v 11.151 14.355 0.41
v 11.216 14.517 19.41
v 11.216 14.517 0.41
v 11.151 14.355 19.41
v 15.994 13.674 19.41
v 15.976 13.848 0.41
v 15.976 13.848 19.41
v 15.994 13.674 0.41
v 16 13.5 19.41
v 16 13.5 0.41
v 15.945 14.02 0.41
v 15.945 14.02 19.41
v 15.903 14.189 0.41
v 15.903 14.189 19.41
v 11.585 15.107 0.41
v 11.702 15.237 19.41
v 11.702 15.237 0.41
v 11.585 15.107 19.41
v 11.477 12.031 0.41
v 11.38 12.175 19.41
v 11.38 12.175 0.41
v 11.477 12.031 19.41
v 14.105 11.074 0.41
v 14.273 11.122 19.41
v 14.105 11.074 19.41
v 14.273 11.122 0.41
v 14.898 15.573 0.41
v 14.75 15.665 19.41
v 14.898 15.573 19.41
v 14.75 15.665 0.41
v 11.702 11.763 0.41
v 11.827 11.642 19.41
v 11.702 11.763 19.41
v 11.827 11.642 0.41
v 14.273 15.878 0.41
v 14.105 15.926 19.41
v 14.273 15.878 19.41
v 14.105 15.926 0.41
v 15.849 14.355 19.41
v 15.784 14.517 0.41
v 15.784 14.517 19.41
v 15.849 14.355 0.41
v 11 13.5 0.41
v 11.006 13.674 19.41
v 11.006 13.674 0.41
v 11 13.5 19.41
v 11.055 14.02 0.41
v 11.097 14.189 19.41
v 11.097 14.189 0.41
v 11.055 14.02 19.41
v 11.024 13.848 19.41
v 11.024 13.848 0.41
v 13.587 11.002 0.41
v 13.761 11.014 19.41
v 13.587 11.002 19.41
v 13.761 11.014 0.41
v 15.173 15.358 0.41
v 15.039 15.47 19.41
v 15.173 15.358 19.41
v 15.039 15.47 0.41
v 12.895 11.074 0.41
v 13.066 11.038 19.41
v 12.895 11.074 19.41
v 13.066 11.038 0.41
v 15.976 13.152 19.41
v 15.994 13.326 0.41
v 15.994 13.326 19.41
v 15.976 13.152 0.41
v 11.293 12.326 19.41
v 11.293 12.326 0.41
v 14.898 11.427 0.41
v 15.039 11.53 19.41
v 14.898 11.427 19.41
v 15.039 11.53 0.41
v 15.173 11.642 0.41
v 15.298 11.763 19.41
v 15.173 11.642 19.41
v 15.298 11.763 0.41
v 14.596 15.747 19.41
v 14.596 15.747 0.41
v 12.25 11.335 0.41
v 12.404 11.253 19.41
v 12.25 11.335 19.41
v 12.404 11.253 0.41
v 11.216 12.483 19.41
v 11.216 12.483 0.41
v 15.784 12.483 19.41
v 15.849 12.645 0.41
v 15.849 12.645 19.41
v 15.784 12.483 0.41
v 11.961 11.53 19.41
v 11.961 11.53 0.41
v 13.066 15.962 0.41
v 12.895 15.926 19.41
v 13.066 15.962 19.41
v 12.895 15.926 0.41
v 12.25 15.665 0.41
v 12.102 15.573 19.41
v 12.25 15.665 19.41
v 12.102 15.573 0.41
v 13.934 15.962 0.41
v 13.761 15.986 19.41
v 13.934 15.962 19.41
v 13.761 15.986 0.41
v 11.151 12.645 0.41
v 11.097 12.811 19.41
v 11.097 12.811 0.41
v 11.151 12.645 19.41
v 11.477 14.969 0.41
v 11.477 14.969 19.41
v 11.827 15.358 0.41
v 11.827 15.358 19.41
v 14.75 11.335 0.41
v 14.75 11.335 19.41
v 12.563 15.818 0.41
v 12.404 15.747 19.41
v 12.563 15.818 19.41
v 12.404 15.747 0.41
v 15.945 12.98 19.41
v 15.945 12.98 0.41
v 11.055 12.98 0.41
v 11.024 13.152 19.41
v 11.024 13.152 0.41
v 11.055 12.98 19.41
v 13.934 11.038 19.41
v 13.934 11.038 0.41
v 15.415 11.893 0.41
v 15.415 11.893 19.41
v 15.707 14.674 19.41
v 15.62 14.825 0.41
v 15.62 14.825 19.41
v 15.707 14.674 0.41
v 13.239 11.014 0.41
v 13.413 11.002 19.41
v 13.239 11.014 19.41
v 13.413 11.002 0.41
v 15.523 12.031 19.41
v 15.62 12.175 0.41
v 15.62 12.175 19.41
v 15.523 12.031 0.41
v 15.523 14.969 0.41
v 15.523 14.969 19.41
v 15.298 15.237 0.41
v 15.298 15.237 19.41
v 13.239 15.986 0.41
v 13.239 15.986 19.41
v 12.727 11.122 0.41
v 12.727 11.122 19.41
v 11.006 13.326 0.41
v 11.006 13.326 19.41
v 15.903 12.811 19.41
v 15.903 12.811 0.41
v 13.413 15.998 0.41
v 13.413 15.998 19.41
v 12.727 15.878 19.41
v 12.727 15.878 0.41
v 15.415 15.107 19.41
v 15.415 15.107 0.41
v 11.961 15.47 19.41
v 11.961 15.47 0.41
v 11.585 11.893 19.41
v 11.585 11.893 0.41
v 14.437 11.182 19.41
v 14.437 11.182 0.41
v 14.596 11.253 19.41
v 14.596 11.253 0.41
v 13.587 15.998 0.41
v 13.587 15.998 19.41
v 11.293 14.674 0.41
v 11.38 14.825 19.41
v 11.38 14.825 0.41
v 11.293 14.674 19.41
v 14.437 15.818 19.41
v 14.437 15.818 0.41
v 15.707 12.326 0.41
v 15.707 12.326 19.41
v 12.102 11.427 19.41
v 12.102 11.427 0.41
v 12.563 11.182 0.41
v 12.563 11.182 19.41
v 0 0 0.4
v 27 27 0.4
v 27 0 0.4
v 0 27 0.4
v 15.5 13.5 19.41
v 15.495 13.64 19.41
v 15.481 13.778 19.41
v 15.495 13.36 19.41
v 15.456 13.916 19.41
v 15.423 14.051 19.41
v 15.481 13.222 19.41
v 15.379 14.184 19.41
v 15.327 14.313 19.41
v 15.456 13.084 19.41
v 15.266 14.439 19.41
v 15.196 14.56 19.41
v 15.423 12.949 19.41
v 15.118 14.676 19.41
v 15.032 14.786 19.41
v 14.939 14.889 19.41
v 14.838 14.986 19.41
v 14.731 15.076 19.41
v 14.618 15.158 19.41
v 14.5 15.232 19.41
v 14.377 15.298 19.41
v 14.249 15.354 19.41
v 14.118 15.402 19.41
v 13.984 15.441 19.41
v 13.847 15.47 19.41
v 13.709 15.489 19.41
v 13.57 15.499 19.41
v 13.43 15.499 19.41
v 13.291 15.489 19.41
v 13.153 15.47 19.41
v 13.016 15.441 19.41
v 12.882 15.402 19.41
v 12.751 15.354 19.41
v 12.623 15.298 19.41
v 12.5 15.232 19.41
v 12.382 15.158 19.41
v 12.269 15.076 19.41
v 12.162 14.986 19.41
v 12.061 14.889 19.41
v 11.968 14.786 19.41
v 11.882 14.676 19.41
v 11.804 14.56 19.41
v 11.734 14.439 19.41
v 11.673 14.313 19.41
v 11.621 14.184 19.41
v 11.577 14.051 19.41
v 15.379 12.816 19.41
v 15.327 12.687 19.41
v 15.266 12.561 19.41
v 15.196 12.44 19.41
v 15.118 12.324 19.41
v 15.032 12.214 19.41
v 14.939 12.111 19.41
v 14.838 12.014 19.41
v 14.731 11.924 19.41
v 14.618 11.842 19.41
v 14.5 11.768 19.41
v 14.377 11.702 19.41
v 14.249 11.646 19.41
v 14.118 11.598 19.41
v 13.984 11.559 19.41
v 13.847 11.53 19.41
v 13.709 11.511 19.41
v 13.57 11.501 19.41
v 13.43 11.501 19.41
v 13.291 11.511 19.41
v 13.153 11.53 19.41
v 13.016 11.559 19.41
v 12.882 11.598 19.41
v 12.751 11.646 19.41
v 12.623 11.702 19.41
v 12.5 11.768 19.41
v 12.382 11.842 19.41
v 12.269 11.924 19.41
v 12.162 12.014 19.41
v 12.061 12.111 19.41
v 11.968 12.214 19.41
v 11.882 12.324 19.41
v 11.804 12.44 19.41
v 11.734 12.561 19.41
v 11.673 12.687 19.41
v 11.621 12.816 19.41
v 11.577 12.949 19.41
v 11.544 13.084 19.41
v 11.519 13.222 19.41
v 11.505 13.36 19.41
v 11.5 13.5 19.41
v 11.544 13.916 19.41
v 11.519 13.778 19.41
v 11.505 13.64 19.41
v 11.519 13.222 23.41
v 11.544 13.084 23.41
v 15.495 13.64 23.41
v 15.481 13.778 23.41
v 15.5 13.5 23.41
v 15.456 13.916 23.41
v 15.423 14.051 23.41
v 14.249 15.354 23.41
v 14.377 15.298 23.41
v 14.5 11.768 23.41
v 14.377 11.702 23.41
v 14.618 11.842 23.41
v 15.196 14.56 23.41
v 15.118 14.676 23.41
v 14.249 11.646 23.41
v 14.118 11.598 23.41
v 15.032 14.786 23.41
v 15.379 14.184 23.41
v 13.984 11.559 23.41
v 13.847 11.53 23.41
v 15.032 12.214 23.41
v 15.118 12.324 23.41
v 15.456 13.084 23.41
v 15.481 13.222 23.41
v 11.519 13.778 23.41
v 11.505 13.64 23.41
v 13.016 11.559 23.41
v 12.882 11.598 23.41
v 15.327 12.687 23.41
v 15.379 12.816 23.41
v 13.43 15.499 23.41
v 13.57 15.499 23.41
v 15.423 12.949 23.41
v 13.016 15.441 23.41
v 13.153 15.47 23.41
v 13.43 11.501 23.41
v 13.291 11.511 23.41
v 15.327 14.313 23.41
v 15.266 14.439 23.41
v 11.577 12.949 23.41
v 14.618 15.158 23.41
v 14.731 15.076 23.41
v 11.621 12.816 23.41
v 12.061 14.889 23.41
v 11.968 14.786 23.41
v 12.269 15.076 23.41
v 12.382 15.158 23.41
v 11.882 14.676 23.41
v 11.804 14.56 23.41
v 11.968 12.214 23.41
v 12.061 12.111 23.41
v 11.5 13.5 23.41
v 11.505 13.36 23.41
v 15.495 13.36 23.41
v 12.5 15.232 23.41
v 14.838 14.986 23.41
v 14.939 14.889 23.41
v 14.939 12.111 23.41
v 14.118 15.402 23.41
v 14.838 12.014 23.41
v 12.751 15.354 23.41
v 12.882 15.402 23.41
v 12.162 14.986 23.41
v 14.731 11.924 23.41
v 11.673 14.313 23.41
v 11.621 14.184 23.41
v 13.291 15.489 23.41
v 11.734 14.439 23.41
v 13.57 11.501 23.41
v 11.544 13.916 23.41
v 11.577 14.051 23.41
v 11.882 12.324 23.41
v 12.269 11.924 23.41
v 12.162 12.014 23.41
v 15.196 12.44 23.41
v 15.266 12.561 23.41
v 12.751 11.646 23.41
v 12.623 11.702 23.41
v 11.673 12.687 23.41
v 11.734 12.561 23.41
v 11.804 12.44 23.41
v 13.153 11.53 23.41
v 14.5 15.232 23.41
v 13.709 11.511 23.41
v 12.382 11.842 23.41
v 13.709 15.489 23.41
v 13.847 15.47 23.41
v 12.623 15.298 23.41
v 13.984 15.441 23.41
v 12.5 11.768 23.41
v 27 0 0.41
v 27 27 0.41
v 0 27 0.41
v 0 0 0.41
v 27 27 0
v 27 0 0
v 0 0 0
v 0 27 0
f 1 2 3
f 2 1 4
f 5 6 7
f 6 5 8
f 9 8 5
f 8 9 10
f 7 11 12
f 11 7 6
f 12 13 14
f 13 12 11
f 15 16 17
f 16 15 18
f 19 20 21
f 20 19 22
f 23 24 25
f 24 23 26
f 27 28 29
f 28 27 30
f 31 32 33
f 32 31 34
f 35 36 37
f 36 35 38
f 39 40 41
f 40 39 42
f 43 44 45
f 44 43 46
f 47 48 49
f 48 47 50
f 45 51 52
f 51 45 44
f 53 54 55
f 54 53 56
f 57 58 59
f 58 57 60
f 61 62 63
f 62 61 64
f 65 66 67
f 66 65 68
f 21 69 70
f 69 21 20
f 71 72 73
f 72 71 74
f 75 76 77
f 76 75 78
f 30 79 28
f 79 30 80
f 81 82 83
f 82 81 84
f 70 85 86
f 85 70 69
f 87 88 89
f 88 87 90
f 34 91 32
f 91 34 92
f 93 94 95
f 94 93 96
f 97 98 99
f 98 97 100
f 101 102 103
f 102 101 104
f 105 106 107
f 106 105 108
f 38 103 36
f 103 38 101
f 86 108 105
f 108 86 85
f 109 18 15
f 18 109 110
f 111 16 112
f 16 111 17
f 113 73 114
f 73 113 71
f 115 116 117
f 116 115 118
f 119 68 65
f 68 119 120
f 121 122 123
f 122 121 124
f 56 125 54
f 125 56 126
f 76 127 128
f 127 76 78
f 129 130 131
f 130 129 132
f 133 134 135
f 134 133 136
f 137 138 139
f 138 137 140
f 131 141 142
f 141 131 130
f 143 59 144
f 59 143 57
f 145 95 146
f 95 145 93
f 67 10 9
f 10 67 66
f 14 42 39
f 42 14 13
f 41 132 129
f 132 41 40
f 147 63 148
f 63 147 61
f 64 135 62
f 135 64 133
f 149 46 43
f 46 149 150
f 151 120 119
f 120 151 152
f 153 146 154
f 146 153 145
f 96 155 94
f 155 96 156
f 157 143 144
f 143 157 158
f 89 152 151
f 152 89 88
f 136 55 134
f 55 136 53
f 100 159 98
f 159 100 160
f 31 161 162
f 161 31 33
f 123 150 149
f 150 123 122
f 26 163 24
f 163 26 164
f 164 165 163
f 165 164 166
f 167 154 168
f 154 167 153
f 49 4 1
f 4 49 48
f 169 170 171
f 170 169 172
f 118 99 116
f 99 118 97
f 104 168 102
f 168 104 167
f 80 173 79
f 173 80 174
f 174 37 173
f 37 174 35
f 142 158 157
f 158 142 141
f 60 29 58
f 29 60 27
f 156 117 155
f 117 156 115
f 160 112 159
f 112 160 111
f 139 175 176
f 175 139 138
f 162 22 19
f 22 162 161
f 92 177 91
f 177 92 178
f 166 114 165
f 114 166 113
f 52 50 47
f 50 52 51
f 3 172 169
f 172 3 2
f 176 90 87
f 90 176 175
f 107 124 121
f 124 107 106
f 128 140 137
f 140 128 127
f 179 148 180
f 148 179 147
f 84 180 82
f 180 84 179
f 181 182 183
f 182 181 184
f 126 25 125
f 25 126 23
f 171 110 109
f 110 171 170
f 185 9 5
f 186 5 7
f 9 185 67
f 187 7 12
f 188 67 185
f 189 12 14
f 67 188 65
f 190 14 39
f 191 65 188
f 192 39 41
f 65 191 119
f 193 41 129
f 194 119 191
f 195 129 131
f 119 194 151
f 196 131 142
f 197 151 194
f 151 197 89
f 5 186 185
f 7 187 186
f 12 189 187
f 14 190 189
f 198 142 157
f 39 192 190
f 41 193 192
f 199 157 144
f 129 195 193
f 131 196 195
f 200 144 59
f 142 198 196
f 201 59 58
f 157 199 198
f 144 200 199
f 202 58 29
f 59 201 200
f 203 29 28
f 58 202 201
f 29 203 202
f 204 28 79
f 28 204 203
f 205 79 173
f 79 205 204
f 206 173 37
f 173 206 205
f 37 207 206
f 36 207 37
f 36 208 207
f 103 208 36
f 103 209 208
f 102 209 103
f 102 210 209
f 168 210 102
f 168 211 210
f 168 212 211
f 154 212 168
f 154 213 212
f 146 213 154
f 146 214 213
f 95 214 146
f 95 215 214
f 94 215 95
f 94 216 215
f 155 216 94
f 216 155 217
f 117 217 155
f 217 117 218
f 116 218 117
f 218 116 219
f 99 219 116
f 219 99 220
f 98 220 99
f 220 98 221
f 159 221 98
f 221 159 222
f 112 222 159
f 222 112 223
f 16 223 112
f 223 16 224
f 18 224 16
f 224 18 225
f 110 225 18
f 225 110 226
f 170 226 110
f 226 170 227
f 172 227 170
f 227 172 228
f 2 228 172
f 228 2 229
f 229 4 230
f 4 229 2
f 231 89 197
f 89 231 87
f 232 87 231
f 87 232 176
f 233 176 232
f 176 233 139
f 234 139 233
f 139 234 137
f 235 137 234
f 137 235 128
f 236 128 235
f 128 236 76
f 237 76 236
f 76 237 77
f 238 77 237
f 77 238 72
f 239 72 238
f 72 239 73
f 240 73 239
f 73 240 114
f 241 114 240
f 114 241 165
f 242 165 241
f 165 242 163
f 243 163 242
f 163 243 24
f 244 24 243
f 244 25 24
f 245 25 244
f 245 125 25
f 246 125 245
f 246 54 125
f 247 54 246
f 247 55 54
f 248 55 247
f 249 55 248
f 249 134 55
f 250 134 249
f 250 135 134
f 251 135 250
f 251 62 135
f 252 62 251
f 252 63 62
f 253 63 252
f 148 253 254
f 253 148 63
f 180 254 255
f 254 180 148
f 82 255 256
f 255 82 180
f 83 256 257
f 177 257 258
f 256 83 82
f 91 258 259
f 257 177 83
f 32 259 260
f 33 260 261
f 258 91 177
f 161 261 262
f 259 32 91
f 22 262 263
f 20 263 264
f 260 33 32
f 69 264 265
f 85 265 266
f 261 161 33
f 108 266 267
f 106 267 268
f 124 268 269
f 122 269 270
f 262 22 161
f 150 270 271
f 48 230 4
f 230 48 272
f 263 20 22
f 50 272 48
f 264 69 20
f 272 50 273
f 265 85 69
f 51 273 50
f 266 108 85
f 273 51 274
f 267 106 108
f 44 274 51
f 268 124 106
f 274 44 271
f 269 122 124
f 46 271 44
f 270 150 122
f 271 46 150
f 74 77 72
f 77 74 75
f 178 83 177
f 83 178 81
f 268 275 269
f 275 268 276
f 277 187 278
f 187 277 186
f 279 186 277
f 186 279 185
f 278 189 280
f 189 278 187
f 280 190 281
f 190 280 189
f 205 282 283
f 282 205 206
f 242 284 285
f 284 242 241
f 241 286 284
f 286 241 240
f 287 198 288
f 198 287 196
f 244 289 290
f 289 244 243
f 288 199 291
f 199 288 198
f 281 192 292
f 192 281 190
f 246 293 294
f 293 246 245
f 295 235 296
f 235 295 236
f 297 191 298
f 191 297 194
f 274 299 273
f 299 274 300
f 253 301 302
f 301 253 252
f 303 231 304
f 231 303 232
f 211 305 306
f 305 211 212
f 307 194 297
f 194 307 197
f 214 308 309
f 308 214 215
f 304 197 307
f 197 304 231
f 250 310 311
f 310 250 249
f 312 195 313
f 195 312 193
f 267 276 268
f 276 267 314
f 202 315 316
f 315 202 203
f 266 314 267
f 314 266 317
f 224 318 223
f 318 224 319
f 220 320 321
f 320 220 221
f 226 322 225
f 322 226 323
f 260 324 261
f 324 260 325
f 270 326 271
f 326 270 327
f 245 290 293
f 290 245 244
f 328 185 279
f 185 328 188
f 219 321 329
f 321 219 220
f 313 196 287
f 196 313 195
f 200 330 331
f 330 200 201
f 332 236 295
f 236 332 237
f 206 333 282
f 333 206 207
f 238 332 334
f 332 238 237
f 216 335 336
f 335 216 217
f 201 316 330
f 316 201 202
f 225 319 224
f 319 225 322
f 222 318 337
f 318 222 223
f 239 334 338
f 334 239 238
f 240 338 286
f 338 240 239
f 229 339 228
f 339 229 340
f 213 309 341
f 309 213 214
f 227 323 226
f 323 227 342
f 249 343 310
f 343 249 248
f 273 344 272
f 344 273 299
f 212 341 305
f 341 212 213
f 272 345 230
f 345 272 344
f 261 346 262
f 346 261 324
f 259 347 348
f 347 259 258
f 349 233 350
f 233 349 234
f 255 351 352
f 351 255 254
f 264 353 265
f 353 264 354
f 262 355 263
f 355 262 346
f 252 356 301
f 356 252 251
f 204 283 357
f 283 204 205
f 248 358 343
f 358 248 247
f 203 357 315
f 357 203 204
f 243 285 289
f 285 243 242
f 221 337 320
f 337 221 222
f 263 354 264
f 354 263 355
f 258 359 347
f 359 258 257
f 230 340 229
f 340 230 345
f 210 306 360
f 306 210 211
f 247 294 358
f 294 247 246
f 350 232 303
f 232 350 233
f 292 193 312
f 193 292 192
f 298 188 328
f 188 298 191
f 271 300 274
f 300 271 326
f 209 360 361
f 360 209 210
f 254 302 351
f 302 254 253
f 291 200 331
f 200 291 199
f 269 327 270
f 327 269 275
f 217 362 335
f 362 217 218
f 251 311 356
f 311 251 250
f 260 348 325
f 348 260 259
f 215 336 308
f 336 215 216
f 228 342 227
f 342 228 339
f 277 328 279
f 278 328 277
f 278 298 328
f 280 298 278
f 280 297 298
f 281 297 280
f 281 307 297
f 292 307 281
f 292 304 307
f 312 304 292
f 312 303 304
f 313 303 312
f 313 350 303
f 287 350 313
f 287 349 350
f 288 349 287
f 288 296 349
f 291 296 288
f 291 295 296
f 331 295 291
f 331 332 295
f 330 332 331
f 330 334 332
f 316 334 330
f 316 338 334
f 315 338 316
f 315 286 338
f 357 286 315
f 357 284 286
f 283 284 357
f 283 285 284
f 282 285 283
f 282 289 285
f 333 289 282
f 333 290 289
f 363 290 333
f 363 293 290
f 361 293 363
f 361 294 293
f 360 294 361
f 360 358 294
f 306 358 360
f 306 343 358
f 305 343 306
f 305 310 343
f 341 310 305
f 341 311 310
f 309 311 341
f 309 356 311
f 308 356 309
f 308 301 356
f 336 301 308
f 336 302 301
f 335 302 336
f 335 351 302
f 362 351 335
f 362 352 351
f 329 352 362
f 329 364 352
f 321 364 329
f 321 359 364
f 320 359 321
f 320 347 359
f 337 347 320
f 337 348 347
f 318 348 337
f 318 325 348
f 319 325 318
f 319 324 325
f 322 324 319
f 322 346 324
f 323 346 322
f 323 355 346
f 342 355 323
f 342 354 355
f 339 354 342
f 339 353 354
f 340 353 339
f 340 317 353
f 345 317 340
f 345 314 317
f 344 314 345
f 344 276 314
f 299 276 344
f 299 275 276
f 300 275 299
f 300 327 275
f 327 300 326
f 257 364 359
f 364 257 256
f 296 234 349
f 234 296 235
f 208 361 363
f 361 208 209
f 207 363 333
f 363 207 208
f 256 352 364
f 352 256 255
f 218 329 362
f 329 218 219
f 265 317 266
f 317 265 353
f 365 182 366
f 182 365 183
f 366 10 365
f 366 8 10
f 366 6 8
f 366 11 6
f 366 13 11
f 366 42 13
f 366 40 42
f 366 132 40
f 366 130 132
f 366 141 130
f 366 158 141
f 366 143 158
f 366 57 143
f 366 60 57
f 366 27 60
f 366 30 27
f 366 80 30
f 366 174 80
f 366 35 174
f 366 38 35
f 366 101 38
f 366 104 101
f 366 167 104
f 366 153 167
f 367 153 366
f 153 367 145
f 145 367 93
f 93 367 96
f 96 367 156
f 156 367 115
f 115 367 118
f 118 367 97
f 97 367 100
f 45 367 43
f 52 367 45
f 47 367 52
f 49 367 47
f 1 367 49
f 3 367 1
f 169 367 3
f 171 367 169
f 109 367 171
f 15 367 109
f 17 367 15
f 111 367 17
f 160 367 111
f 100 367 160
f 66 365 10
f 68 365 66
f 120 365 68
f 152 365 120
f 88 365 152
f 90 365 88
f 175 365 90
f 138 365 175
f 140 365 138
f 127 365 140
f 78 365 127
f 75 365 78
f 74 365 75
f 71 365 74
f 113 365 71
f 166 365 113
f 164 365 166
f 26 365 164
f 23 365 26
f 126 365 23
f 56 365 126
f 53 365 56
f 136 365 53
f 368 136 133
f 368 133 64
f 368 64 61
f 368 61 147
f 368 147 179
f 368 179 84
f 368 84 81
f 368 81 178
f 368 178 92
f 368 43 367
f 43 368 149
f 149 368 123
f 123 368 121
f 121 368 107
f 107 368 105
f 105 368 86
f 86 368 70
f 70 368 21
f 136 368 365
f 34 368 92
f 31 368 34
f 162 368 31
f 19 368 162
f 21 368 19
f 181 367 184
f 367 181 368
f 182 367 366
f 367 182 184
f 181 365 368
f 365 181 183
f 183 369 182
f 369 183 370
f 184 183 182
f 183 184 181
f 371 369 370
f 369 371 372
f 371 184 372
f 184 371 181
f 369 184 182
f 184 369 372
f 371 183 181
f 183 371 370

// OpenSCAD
// file: ../../Base/Boxes.scad
// Fischertechnik Box Foundation
// Pre-designed Boxes

use <Constants.scad>

include <PlacementOptions.scad>

box190Width = 190;
box190Depth = 130;
box130Width = 130;
box130Depth = 95;
boxUsageHeight = 33.9;
boxWallThickness = 2.4;
boxBaseThickness = 1.0;
boxWebWidth = 3.0;

// getBoxWallThickness()
// Gets the wall thickness of a Fischertechnik Box

function getBoxWallThickness() = boxWallThickness;

// Gets the usable height of a fischertechnik box
function getBoxUsageHeight() = boxUsageHeight;

// Gets the thickness of the Fischertechnik box base.
function getBoxBaseThickness() = boxBaseThickness;

// Gets the width of a box web
function getBoxWebWidth() = boxWebWidth;

// Gets the usable inner space of a Box 190 as an x/y-list
function getBox190Space() = [
    box190Width - 2*getBoxWallThickness(), 
    box190Depth - 2*getBoxWallThickness() ];

// Imports the Fischertechnik empty box 130x190 mm and places it at position 0,0
// 190x130 are the outer sizes, the inner space is slightly smaller. Use getBox190Space() to get the inner sizes.
// This module needs the STL file "Fischertechnik Box 130x190.stl" in the library path.
// The box is positioned that the usable inner space is at the 0,0,0 position. The

module Box190() {
    translate([-getBoxWallThickness(),-getBoxWallThickness(),-getBoxBaseThickness()])
        import("Fischertechnik Box 130x190.stl", convexity=3);
}

// Gets the usable inner space of a Box 130 as an x/y-list
function getBox130Space() = [
    box130Width - 2*getBoxWallThickness(), 
    box130Depth - 2*getBoxWallThickness() ];

// Imports the Fischertechnik empty box 95x130 mm and places it at position 0,0
// 190x130 are the outer sizes, the inner space is slightly smaller. Use getBox190Space() to get the inner sizes.
// This module needs the STL file "Fischertechnik Box 95x130.stl" in the library path.
// The box is positioned that the usable inner space is at the 0,0,0 position. The

module Box130() {
    translate([-getBoxWallThickness(),-getBoxWallThickness(),-getBoxBaseThickness()])
        import("Fischertechnik Box 95x130.stl", convexity=3);
}

// Creates a web at the specified box walls
// corner 0 = LowerLeft, 1 = UpperLeft, 2 = UpperRight, 3 = LowerRight
// side 0 = LeftOfCorner, 1 = RightOfCorner
// distance = Distance in mm from the corner
// box = inner width and depth of the box (default: Box 190)
// webWidth = length of the web (default is 3 mms)
// webThickness = thickness of the web (default is 1 mm)

module BoxWeb(corner, side, distance, box=getBox190Space(), webWidth=getBoxWebWidth(), webThickness=1.0) {
    sink = getBoxWallThickness()/2;

    width = (corner % 2 == 0) ? 
            (side == LeftOfCorner ? webWidth : webThickness) :
            (side == LeftOfCorner ? webThickness : webWidth);

    depth = (corner % 2 == 0) ? 
            (side == RightOfCorner ? webWidth : webThickness) :
            (side == RightOfCorner ? webThickness : webWidth);
    
    xDiff = corner == LowerLeft ? 
                (side == LeftOfCorner ? -sink : distance) :
            (corner == UpperLeft ?                
                (side == LeftOfCorner ? distance : -sink) :
            (corner == UpperRight ?
                (side == LeftOfCorner ? box.x-webWidth+sink : box.x-distance-webThickness) :
                (side == LeftOfCorner ? box.x-distance-webThickness: box.x-webWidth+sink)));

    yDiff = corner == LowerLeft ? 
                (side == RightOfCorner ? -sink : distance) :
            (corner == UpperLeft ?
                (side == RightOfCorner ? box.y-distance : box.y-webWidth+sink) :
            (corner == UpperRight ?
                (side == RightOfCorner ? box.y-webWidth+sink : box.y-distance) :
                (side == RightOfCorner ? distance : -sink)));
    
    translate([xDiff, yDiff, -getExcess()])
        cube([width, depth, boxUsageHeight + 2*getExcess()]);
}
// file: ../../Base/Rotation.scad
// Fischertechnik Box Foundation
// Geometry Helpers Rotation

include <PlacementOptions.scad>

// getRotatedSpace(space, rotation=NoRotation)
// Rotates the space dependent on the specified rotation

function getRotatedSpace(space, rotation=NoRotation) = [
    (rotation == Rotate90 || rotation == Rotate270) ? space.y : space.x,
    (rotation == Rotate90 || rotation == Rotate270) ? space.x : space.y
];

// Rotates the given space around the fixed left lower corner
// space = the space the children needs as width/depth list [width,depth]
// rotation = 0 Rotate0 degrees, 1 Rotate90 degrees, 2 Rotate180 degrees, 3 Rotate270 degrees (equivalent to -90)

module RotateFix(space, rotation=Rotate0) {
    dy = (rotation == Rotate0 || rotation == Rotate270) ? 0 :
        (rotation == Rotate90) ? space.x :
        space.y;
    dx = (rotation < Rotate180) ? 0 :
        (rotation == Rotate180) ? space.x :
        space.y;
    
    translate([dx, dy, 0])
        rotate([0, 0, rotations[rotation]])
            children();
}
// file: ../../Base/Alignment.scad
// Fischertechnik Box Foundation
// Geometry Helpers Alignment

include <PlacementOptions.scad>

// getAlignedX(elementWidth, spaceWidth, align=AlignRight, offset=0)
// Gets the aligned X offset of an element with the given
// width in the given space.
// elementWidth = The width of the element to positon
// spaceWidth = The space where the element should be aligned
// align = 0 AlignLeft, 1 AlignCenter, 2 AlignRight
// offset = an optional offset from the aligned position. When
// aligned left or centered, then positive values are in X direction.
// When aligned right then positive values are in negative X direction.

function getAlignedX(elementWidth, spaceWidth, align=AlignRight, offset=0) =
    (align == AlignLeft) ?
        offset :
        ((align == AlignCenter) ?
        (spaceWidth - elementWidth)/2 + offset :
        spaceWidth - offset - elementWidth);

// getAlignedY(elementDepth, spaceDepth, align=AlignTop, offset=0)
// Gets the aligned Y offset of an element with the given
// depth in the given space.
// elementDepth = The depth of the element to positon
// spaceDepth = The space where the element should be aligned
// align = 0 AlignBottom, 1 AlignCenter, 2 AlignTop
// offset = an optional offset from the aligned position. When
// aligned bottom or centered, then positive values are in Y direction.
// When aligned top then positive values are in negative Y direction.

function getAlignedY(elementDepth, spaceDepth, align=AlignTop, offset=0) =
    (align == AlignBottom) ?
        offset :
        ((align == AlignCenter) ?
        (spaceDepth - elementDepth)/2 + offset :
        spaceDepth - offset - elementDepth);
// file: ../../Base/PlacementOptions.scad
// Fischertechnik Box Foundation
// Placement Options

// Alignment
NoAlign = 0;
AlignLeft = 1;
AlignBottom = 2;
AlignCenter = 3;
AlignRight = 4;
AlignTop = 5;

// Element rotation degree steps
rotations = [0, -90, -180, -270];

// Rotation
NoRotation = 0;
Rotate0 = 0;
Rotate90 = 1;
Rotate180 = 2;
Rotate270 = 3;

// Docking (seen from above)
NoDock = -1;
DockLeft = 0;
DockTop = 1;
DockRight = 2;
DockCorner = 2;
DockBottom = 3;

// Web corners
LowerLeft = 0;
UpperLeft = 1;
UpperRight = 2;
LowerRight = 3;

// Web position relative to corner
LeftOfCorner = 0;
RightOfCorner = 1;
// file: ../../Base/Placement.scad
// Fischertechnik Box Foundation
// Geometry Helpers Placement

use <Constants.scad>
use <Alignment.scad>
use <Rotation.scad>
use <Boxes.scad>

include <PlacementOptions.scad>

// Place(x=0, y=0, elementSpace=[0,0], alignX=AlignLeft, alignY=AlignBottom, rotation=Rotate0, boxSpace=getBox190Space())
// Places the child at the specified position
// y = Y-Position. This is a relative position when an X aligment is specified.
// x = X-Position. This is a relative position when an Y aligment is specified.
// elementSpace = space of the element to be placed [x,y]
// alignX = -1=NoAlign, 0 AlignLeft, 1 AlignCenter, 3 AlignRight (elementSpace and boxSpace required!)
// alignY = -1=NoAlign, 2 AlignBottom, 1 AlignCenter, 4 AlignTop (elementSpace and boxSpace required!)
// rotation = 0 Rotate0 0 degrees, 1 Rotate90 90 degrees, 
// 2 Rotate180 180 degrees, 3 Rotate270 270 degrees (equivalent to -90)
// boxSpace = Inner space of the box where the placement occurs [x,y] - default is Box 190x130 inner space

module Place(x=0, y=0, elementSpace=[0,0], 
  alignX=AlignLeft, alignY=AlignBottom, 
  rotation=NoRotation, boxSpace=getBox190Space()) {

    module Position(x, y, space, rotation=Rotate0) {
        translate([x, y, 0])
            RotateFix(space, rotation)
                children();
    }

    space = getRotatedSpace(elementSpace, rotation);
    alignedX = getAlignedX(space.x, boxSpace.x, alignX, x);
    alignedY = getAlignedY(space.y, boxSpace.y, alignY, y);
    Position(alignedX, alignedY, elementSpace, rotation)
        children();
}

// Center(space=getBox130Space(), elementSpace=[0,0])
// space = Space where the children is centered. For cylinder use centered=true and no elementSpace.
// elementSpace = space of the element to be centered [x,y]

module Center(space=getBox190Space(), elementSpace=[0,0]) {
    translate([(space.x - elementSpace.x) / 2, (space.y - elementSpace.y) / 2])
        children(0);
}

// CenterHorizontal(width=0, y=0, offset=0, space=getBox130Space())
// space = Space where the children is centered. For cylinder use centered=true and no elementSpace.
// elementSpace = space of the element to be centered [x,y]

module CenterHorizontal(width=0, y=0, offset=0, space=getBox190Space()) {
    translate([(space.x - width) / 2 + offset, y])
        children(0);
}

// CenterVertical(depth=0, x=0, offset=0, space=getBox130Space())
// space = Space where the children is centered. For cylinder use centered=true and no elementSpace.
// elementSpace = space of the element to be centered [x,y]

module CenterVertical(depth=0, x=0, offset=0, space=getBox190Space()) {
    translate([x, (space.y - depth) / 2 + offset])
        children(0);
}
// file: ../../Elements/AxisClip10.scad
// Fischertechnik Box Library
// Axis for clip 10
// 31023

use <../ModelBase/Simple.scad>

width = 12;
depth = 12;
height = 23;

// getAxisClip10Space()
// Gets the space of a frame for a clip 10 with spring ring (mot2)

function getAxisClip10Space() = [width, depth, height];

// AxisClip10()
// Axis for clip 10 with spring ring (mot2)

module AxisClip10() {
    LeveledAxisWithSpace(height, height-10, getAxisClip10Space());
}

// Tests
color("lightgray")
AxisClip10();
// file: ../../Base/Constants.scad
// Fischertechnik Box Foundation
// Constants

// Constant values necessary for multiple elements

// Base constants
dividerThickness = 1.2;
excess = 0.01;
fragments = 90;
tolerance = 0.8;

// Gets the thickness of a divider 
function getDividerThickness() = dividerThickness;

// Gets the excess that is used to merge walls into each other
function getExcess() = excess;

// Gets amount of fragments of a cylinder
function getFragments() = fragments;

// Gets the inner tolerance of a frame to each side
function getTolerance() = tolerance;


// Fischertechnik specific constants
axisDiameter = 4;
axisBottomDiameter = axisDiameter + 1;
standardEdgeDistance = 2.5;
standardWebDistance = 11.5;
standardCornerLength = 15;
tubeWallFactor = 0.8;

// Gets axis diameter
function getAxisDiameter() = axisDiameter;

// Gets axis bottom diameter for thicker part at the bottom
function getAxisBottomDiameter() = axisBottomDiameter;

// gets the standard distance to the wall of the box for dockable frames with webs
function getStandardEdgeDistance() = standardEdgeDistance;

// gets the standard distance of each web to the corner of the dockable frame
function getStandardWebDistance() = standardWebDistance;

// gets the standard length of the corner walls of a dockable frame
function getStandardCornerLength() = standardCornerLength;

// gets the wall thickness of a tube.
function getTubeWallThickness() = tubeWallFactor * getDividerThickness();
// file: ../../Elements/AxisIdlerGearZ15.scad
// Fischertechnik Box Library
// Axis for idler gear Z15
// 35695

use <../ModelBase/Simple.scad>

width = 27;
depth = 27;
height = 23;

// getAxisIdlerGearZ15Space()
// Gets the space of an axis for an idler gear Z15 (mot2)

function getAxisIdlerGearZ15Space() = [width, depth, height];

// AxisIdlerGearZ15()
// Axis for for an idler gear Z15 (mot2)

module AxisIdlerGearZ15() {
    LeveledAxisWithSpace(height, height-4, getAxisIdlerGearZ15Space());
}

// Tests
color("lightgray")
AxisIdlerGearZ15();
// file: ../TestPrint.scad
// 3D Print Test Base

use <../Base/Constants.scad>

use <../Elements/AxisClip10.scad>

module TestPrint(elementSpace) {
    cube([elementSpace.x, elementSpace.y, 0.4]);
    translate([0,0,0.4+getExcess()]) {
        children();
    }
}

TestPrint(getAxisClip10Space())
    AxisClip10();
// main file
// 3D Print Test Base
// AxisIdlerGearZ15

use <../TestPrint.scad>
use <../../Elements/AxisIdlerGearZ15.scad>

TestPrint(getAxisIdlerGearZ15Space())
    AxisIdlerGearZ15();
